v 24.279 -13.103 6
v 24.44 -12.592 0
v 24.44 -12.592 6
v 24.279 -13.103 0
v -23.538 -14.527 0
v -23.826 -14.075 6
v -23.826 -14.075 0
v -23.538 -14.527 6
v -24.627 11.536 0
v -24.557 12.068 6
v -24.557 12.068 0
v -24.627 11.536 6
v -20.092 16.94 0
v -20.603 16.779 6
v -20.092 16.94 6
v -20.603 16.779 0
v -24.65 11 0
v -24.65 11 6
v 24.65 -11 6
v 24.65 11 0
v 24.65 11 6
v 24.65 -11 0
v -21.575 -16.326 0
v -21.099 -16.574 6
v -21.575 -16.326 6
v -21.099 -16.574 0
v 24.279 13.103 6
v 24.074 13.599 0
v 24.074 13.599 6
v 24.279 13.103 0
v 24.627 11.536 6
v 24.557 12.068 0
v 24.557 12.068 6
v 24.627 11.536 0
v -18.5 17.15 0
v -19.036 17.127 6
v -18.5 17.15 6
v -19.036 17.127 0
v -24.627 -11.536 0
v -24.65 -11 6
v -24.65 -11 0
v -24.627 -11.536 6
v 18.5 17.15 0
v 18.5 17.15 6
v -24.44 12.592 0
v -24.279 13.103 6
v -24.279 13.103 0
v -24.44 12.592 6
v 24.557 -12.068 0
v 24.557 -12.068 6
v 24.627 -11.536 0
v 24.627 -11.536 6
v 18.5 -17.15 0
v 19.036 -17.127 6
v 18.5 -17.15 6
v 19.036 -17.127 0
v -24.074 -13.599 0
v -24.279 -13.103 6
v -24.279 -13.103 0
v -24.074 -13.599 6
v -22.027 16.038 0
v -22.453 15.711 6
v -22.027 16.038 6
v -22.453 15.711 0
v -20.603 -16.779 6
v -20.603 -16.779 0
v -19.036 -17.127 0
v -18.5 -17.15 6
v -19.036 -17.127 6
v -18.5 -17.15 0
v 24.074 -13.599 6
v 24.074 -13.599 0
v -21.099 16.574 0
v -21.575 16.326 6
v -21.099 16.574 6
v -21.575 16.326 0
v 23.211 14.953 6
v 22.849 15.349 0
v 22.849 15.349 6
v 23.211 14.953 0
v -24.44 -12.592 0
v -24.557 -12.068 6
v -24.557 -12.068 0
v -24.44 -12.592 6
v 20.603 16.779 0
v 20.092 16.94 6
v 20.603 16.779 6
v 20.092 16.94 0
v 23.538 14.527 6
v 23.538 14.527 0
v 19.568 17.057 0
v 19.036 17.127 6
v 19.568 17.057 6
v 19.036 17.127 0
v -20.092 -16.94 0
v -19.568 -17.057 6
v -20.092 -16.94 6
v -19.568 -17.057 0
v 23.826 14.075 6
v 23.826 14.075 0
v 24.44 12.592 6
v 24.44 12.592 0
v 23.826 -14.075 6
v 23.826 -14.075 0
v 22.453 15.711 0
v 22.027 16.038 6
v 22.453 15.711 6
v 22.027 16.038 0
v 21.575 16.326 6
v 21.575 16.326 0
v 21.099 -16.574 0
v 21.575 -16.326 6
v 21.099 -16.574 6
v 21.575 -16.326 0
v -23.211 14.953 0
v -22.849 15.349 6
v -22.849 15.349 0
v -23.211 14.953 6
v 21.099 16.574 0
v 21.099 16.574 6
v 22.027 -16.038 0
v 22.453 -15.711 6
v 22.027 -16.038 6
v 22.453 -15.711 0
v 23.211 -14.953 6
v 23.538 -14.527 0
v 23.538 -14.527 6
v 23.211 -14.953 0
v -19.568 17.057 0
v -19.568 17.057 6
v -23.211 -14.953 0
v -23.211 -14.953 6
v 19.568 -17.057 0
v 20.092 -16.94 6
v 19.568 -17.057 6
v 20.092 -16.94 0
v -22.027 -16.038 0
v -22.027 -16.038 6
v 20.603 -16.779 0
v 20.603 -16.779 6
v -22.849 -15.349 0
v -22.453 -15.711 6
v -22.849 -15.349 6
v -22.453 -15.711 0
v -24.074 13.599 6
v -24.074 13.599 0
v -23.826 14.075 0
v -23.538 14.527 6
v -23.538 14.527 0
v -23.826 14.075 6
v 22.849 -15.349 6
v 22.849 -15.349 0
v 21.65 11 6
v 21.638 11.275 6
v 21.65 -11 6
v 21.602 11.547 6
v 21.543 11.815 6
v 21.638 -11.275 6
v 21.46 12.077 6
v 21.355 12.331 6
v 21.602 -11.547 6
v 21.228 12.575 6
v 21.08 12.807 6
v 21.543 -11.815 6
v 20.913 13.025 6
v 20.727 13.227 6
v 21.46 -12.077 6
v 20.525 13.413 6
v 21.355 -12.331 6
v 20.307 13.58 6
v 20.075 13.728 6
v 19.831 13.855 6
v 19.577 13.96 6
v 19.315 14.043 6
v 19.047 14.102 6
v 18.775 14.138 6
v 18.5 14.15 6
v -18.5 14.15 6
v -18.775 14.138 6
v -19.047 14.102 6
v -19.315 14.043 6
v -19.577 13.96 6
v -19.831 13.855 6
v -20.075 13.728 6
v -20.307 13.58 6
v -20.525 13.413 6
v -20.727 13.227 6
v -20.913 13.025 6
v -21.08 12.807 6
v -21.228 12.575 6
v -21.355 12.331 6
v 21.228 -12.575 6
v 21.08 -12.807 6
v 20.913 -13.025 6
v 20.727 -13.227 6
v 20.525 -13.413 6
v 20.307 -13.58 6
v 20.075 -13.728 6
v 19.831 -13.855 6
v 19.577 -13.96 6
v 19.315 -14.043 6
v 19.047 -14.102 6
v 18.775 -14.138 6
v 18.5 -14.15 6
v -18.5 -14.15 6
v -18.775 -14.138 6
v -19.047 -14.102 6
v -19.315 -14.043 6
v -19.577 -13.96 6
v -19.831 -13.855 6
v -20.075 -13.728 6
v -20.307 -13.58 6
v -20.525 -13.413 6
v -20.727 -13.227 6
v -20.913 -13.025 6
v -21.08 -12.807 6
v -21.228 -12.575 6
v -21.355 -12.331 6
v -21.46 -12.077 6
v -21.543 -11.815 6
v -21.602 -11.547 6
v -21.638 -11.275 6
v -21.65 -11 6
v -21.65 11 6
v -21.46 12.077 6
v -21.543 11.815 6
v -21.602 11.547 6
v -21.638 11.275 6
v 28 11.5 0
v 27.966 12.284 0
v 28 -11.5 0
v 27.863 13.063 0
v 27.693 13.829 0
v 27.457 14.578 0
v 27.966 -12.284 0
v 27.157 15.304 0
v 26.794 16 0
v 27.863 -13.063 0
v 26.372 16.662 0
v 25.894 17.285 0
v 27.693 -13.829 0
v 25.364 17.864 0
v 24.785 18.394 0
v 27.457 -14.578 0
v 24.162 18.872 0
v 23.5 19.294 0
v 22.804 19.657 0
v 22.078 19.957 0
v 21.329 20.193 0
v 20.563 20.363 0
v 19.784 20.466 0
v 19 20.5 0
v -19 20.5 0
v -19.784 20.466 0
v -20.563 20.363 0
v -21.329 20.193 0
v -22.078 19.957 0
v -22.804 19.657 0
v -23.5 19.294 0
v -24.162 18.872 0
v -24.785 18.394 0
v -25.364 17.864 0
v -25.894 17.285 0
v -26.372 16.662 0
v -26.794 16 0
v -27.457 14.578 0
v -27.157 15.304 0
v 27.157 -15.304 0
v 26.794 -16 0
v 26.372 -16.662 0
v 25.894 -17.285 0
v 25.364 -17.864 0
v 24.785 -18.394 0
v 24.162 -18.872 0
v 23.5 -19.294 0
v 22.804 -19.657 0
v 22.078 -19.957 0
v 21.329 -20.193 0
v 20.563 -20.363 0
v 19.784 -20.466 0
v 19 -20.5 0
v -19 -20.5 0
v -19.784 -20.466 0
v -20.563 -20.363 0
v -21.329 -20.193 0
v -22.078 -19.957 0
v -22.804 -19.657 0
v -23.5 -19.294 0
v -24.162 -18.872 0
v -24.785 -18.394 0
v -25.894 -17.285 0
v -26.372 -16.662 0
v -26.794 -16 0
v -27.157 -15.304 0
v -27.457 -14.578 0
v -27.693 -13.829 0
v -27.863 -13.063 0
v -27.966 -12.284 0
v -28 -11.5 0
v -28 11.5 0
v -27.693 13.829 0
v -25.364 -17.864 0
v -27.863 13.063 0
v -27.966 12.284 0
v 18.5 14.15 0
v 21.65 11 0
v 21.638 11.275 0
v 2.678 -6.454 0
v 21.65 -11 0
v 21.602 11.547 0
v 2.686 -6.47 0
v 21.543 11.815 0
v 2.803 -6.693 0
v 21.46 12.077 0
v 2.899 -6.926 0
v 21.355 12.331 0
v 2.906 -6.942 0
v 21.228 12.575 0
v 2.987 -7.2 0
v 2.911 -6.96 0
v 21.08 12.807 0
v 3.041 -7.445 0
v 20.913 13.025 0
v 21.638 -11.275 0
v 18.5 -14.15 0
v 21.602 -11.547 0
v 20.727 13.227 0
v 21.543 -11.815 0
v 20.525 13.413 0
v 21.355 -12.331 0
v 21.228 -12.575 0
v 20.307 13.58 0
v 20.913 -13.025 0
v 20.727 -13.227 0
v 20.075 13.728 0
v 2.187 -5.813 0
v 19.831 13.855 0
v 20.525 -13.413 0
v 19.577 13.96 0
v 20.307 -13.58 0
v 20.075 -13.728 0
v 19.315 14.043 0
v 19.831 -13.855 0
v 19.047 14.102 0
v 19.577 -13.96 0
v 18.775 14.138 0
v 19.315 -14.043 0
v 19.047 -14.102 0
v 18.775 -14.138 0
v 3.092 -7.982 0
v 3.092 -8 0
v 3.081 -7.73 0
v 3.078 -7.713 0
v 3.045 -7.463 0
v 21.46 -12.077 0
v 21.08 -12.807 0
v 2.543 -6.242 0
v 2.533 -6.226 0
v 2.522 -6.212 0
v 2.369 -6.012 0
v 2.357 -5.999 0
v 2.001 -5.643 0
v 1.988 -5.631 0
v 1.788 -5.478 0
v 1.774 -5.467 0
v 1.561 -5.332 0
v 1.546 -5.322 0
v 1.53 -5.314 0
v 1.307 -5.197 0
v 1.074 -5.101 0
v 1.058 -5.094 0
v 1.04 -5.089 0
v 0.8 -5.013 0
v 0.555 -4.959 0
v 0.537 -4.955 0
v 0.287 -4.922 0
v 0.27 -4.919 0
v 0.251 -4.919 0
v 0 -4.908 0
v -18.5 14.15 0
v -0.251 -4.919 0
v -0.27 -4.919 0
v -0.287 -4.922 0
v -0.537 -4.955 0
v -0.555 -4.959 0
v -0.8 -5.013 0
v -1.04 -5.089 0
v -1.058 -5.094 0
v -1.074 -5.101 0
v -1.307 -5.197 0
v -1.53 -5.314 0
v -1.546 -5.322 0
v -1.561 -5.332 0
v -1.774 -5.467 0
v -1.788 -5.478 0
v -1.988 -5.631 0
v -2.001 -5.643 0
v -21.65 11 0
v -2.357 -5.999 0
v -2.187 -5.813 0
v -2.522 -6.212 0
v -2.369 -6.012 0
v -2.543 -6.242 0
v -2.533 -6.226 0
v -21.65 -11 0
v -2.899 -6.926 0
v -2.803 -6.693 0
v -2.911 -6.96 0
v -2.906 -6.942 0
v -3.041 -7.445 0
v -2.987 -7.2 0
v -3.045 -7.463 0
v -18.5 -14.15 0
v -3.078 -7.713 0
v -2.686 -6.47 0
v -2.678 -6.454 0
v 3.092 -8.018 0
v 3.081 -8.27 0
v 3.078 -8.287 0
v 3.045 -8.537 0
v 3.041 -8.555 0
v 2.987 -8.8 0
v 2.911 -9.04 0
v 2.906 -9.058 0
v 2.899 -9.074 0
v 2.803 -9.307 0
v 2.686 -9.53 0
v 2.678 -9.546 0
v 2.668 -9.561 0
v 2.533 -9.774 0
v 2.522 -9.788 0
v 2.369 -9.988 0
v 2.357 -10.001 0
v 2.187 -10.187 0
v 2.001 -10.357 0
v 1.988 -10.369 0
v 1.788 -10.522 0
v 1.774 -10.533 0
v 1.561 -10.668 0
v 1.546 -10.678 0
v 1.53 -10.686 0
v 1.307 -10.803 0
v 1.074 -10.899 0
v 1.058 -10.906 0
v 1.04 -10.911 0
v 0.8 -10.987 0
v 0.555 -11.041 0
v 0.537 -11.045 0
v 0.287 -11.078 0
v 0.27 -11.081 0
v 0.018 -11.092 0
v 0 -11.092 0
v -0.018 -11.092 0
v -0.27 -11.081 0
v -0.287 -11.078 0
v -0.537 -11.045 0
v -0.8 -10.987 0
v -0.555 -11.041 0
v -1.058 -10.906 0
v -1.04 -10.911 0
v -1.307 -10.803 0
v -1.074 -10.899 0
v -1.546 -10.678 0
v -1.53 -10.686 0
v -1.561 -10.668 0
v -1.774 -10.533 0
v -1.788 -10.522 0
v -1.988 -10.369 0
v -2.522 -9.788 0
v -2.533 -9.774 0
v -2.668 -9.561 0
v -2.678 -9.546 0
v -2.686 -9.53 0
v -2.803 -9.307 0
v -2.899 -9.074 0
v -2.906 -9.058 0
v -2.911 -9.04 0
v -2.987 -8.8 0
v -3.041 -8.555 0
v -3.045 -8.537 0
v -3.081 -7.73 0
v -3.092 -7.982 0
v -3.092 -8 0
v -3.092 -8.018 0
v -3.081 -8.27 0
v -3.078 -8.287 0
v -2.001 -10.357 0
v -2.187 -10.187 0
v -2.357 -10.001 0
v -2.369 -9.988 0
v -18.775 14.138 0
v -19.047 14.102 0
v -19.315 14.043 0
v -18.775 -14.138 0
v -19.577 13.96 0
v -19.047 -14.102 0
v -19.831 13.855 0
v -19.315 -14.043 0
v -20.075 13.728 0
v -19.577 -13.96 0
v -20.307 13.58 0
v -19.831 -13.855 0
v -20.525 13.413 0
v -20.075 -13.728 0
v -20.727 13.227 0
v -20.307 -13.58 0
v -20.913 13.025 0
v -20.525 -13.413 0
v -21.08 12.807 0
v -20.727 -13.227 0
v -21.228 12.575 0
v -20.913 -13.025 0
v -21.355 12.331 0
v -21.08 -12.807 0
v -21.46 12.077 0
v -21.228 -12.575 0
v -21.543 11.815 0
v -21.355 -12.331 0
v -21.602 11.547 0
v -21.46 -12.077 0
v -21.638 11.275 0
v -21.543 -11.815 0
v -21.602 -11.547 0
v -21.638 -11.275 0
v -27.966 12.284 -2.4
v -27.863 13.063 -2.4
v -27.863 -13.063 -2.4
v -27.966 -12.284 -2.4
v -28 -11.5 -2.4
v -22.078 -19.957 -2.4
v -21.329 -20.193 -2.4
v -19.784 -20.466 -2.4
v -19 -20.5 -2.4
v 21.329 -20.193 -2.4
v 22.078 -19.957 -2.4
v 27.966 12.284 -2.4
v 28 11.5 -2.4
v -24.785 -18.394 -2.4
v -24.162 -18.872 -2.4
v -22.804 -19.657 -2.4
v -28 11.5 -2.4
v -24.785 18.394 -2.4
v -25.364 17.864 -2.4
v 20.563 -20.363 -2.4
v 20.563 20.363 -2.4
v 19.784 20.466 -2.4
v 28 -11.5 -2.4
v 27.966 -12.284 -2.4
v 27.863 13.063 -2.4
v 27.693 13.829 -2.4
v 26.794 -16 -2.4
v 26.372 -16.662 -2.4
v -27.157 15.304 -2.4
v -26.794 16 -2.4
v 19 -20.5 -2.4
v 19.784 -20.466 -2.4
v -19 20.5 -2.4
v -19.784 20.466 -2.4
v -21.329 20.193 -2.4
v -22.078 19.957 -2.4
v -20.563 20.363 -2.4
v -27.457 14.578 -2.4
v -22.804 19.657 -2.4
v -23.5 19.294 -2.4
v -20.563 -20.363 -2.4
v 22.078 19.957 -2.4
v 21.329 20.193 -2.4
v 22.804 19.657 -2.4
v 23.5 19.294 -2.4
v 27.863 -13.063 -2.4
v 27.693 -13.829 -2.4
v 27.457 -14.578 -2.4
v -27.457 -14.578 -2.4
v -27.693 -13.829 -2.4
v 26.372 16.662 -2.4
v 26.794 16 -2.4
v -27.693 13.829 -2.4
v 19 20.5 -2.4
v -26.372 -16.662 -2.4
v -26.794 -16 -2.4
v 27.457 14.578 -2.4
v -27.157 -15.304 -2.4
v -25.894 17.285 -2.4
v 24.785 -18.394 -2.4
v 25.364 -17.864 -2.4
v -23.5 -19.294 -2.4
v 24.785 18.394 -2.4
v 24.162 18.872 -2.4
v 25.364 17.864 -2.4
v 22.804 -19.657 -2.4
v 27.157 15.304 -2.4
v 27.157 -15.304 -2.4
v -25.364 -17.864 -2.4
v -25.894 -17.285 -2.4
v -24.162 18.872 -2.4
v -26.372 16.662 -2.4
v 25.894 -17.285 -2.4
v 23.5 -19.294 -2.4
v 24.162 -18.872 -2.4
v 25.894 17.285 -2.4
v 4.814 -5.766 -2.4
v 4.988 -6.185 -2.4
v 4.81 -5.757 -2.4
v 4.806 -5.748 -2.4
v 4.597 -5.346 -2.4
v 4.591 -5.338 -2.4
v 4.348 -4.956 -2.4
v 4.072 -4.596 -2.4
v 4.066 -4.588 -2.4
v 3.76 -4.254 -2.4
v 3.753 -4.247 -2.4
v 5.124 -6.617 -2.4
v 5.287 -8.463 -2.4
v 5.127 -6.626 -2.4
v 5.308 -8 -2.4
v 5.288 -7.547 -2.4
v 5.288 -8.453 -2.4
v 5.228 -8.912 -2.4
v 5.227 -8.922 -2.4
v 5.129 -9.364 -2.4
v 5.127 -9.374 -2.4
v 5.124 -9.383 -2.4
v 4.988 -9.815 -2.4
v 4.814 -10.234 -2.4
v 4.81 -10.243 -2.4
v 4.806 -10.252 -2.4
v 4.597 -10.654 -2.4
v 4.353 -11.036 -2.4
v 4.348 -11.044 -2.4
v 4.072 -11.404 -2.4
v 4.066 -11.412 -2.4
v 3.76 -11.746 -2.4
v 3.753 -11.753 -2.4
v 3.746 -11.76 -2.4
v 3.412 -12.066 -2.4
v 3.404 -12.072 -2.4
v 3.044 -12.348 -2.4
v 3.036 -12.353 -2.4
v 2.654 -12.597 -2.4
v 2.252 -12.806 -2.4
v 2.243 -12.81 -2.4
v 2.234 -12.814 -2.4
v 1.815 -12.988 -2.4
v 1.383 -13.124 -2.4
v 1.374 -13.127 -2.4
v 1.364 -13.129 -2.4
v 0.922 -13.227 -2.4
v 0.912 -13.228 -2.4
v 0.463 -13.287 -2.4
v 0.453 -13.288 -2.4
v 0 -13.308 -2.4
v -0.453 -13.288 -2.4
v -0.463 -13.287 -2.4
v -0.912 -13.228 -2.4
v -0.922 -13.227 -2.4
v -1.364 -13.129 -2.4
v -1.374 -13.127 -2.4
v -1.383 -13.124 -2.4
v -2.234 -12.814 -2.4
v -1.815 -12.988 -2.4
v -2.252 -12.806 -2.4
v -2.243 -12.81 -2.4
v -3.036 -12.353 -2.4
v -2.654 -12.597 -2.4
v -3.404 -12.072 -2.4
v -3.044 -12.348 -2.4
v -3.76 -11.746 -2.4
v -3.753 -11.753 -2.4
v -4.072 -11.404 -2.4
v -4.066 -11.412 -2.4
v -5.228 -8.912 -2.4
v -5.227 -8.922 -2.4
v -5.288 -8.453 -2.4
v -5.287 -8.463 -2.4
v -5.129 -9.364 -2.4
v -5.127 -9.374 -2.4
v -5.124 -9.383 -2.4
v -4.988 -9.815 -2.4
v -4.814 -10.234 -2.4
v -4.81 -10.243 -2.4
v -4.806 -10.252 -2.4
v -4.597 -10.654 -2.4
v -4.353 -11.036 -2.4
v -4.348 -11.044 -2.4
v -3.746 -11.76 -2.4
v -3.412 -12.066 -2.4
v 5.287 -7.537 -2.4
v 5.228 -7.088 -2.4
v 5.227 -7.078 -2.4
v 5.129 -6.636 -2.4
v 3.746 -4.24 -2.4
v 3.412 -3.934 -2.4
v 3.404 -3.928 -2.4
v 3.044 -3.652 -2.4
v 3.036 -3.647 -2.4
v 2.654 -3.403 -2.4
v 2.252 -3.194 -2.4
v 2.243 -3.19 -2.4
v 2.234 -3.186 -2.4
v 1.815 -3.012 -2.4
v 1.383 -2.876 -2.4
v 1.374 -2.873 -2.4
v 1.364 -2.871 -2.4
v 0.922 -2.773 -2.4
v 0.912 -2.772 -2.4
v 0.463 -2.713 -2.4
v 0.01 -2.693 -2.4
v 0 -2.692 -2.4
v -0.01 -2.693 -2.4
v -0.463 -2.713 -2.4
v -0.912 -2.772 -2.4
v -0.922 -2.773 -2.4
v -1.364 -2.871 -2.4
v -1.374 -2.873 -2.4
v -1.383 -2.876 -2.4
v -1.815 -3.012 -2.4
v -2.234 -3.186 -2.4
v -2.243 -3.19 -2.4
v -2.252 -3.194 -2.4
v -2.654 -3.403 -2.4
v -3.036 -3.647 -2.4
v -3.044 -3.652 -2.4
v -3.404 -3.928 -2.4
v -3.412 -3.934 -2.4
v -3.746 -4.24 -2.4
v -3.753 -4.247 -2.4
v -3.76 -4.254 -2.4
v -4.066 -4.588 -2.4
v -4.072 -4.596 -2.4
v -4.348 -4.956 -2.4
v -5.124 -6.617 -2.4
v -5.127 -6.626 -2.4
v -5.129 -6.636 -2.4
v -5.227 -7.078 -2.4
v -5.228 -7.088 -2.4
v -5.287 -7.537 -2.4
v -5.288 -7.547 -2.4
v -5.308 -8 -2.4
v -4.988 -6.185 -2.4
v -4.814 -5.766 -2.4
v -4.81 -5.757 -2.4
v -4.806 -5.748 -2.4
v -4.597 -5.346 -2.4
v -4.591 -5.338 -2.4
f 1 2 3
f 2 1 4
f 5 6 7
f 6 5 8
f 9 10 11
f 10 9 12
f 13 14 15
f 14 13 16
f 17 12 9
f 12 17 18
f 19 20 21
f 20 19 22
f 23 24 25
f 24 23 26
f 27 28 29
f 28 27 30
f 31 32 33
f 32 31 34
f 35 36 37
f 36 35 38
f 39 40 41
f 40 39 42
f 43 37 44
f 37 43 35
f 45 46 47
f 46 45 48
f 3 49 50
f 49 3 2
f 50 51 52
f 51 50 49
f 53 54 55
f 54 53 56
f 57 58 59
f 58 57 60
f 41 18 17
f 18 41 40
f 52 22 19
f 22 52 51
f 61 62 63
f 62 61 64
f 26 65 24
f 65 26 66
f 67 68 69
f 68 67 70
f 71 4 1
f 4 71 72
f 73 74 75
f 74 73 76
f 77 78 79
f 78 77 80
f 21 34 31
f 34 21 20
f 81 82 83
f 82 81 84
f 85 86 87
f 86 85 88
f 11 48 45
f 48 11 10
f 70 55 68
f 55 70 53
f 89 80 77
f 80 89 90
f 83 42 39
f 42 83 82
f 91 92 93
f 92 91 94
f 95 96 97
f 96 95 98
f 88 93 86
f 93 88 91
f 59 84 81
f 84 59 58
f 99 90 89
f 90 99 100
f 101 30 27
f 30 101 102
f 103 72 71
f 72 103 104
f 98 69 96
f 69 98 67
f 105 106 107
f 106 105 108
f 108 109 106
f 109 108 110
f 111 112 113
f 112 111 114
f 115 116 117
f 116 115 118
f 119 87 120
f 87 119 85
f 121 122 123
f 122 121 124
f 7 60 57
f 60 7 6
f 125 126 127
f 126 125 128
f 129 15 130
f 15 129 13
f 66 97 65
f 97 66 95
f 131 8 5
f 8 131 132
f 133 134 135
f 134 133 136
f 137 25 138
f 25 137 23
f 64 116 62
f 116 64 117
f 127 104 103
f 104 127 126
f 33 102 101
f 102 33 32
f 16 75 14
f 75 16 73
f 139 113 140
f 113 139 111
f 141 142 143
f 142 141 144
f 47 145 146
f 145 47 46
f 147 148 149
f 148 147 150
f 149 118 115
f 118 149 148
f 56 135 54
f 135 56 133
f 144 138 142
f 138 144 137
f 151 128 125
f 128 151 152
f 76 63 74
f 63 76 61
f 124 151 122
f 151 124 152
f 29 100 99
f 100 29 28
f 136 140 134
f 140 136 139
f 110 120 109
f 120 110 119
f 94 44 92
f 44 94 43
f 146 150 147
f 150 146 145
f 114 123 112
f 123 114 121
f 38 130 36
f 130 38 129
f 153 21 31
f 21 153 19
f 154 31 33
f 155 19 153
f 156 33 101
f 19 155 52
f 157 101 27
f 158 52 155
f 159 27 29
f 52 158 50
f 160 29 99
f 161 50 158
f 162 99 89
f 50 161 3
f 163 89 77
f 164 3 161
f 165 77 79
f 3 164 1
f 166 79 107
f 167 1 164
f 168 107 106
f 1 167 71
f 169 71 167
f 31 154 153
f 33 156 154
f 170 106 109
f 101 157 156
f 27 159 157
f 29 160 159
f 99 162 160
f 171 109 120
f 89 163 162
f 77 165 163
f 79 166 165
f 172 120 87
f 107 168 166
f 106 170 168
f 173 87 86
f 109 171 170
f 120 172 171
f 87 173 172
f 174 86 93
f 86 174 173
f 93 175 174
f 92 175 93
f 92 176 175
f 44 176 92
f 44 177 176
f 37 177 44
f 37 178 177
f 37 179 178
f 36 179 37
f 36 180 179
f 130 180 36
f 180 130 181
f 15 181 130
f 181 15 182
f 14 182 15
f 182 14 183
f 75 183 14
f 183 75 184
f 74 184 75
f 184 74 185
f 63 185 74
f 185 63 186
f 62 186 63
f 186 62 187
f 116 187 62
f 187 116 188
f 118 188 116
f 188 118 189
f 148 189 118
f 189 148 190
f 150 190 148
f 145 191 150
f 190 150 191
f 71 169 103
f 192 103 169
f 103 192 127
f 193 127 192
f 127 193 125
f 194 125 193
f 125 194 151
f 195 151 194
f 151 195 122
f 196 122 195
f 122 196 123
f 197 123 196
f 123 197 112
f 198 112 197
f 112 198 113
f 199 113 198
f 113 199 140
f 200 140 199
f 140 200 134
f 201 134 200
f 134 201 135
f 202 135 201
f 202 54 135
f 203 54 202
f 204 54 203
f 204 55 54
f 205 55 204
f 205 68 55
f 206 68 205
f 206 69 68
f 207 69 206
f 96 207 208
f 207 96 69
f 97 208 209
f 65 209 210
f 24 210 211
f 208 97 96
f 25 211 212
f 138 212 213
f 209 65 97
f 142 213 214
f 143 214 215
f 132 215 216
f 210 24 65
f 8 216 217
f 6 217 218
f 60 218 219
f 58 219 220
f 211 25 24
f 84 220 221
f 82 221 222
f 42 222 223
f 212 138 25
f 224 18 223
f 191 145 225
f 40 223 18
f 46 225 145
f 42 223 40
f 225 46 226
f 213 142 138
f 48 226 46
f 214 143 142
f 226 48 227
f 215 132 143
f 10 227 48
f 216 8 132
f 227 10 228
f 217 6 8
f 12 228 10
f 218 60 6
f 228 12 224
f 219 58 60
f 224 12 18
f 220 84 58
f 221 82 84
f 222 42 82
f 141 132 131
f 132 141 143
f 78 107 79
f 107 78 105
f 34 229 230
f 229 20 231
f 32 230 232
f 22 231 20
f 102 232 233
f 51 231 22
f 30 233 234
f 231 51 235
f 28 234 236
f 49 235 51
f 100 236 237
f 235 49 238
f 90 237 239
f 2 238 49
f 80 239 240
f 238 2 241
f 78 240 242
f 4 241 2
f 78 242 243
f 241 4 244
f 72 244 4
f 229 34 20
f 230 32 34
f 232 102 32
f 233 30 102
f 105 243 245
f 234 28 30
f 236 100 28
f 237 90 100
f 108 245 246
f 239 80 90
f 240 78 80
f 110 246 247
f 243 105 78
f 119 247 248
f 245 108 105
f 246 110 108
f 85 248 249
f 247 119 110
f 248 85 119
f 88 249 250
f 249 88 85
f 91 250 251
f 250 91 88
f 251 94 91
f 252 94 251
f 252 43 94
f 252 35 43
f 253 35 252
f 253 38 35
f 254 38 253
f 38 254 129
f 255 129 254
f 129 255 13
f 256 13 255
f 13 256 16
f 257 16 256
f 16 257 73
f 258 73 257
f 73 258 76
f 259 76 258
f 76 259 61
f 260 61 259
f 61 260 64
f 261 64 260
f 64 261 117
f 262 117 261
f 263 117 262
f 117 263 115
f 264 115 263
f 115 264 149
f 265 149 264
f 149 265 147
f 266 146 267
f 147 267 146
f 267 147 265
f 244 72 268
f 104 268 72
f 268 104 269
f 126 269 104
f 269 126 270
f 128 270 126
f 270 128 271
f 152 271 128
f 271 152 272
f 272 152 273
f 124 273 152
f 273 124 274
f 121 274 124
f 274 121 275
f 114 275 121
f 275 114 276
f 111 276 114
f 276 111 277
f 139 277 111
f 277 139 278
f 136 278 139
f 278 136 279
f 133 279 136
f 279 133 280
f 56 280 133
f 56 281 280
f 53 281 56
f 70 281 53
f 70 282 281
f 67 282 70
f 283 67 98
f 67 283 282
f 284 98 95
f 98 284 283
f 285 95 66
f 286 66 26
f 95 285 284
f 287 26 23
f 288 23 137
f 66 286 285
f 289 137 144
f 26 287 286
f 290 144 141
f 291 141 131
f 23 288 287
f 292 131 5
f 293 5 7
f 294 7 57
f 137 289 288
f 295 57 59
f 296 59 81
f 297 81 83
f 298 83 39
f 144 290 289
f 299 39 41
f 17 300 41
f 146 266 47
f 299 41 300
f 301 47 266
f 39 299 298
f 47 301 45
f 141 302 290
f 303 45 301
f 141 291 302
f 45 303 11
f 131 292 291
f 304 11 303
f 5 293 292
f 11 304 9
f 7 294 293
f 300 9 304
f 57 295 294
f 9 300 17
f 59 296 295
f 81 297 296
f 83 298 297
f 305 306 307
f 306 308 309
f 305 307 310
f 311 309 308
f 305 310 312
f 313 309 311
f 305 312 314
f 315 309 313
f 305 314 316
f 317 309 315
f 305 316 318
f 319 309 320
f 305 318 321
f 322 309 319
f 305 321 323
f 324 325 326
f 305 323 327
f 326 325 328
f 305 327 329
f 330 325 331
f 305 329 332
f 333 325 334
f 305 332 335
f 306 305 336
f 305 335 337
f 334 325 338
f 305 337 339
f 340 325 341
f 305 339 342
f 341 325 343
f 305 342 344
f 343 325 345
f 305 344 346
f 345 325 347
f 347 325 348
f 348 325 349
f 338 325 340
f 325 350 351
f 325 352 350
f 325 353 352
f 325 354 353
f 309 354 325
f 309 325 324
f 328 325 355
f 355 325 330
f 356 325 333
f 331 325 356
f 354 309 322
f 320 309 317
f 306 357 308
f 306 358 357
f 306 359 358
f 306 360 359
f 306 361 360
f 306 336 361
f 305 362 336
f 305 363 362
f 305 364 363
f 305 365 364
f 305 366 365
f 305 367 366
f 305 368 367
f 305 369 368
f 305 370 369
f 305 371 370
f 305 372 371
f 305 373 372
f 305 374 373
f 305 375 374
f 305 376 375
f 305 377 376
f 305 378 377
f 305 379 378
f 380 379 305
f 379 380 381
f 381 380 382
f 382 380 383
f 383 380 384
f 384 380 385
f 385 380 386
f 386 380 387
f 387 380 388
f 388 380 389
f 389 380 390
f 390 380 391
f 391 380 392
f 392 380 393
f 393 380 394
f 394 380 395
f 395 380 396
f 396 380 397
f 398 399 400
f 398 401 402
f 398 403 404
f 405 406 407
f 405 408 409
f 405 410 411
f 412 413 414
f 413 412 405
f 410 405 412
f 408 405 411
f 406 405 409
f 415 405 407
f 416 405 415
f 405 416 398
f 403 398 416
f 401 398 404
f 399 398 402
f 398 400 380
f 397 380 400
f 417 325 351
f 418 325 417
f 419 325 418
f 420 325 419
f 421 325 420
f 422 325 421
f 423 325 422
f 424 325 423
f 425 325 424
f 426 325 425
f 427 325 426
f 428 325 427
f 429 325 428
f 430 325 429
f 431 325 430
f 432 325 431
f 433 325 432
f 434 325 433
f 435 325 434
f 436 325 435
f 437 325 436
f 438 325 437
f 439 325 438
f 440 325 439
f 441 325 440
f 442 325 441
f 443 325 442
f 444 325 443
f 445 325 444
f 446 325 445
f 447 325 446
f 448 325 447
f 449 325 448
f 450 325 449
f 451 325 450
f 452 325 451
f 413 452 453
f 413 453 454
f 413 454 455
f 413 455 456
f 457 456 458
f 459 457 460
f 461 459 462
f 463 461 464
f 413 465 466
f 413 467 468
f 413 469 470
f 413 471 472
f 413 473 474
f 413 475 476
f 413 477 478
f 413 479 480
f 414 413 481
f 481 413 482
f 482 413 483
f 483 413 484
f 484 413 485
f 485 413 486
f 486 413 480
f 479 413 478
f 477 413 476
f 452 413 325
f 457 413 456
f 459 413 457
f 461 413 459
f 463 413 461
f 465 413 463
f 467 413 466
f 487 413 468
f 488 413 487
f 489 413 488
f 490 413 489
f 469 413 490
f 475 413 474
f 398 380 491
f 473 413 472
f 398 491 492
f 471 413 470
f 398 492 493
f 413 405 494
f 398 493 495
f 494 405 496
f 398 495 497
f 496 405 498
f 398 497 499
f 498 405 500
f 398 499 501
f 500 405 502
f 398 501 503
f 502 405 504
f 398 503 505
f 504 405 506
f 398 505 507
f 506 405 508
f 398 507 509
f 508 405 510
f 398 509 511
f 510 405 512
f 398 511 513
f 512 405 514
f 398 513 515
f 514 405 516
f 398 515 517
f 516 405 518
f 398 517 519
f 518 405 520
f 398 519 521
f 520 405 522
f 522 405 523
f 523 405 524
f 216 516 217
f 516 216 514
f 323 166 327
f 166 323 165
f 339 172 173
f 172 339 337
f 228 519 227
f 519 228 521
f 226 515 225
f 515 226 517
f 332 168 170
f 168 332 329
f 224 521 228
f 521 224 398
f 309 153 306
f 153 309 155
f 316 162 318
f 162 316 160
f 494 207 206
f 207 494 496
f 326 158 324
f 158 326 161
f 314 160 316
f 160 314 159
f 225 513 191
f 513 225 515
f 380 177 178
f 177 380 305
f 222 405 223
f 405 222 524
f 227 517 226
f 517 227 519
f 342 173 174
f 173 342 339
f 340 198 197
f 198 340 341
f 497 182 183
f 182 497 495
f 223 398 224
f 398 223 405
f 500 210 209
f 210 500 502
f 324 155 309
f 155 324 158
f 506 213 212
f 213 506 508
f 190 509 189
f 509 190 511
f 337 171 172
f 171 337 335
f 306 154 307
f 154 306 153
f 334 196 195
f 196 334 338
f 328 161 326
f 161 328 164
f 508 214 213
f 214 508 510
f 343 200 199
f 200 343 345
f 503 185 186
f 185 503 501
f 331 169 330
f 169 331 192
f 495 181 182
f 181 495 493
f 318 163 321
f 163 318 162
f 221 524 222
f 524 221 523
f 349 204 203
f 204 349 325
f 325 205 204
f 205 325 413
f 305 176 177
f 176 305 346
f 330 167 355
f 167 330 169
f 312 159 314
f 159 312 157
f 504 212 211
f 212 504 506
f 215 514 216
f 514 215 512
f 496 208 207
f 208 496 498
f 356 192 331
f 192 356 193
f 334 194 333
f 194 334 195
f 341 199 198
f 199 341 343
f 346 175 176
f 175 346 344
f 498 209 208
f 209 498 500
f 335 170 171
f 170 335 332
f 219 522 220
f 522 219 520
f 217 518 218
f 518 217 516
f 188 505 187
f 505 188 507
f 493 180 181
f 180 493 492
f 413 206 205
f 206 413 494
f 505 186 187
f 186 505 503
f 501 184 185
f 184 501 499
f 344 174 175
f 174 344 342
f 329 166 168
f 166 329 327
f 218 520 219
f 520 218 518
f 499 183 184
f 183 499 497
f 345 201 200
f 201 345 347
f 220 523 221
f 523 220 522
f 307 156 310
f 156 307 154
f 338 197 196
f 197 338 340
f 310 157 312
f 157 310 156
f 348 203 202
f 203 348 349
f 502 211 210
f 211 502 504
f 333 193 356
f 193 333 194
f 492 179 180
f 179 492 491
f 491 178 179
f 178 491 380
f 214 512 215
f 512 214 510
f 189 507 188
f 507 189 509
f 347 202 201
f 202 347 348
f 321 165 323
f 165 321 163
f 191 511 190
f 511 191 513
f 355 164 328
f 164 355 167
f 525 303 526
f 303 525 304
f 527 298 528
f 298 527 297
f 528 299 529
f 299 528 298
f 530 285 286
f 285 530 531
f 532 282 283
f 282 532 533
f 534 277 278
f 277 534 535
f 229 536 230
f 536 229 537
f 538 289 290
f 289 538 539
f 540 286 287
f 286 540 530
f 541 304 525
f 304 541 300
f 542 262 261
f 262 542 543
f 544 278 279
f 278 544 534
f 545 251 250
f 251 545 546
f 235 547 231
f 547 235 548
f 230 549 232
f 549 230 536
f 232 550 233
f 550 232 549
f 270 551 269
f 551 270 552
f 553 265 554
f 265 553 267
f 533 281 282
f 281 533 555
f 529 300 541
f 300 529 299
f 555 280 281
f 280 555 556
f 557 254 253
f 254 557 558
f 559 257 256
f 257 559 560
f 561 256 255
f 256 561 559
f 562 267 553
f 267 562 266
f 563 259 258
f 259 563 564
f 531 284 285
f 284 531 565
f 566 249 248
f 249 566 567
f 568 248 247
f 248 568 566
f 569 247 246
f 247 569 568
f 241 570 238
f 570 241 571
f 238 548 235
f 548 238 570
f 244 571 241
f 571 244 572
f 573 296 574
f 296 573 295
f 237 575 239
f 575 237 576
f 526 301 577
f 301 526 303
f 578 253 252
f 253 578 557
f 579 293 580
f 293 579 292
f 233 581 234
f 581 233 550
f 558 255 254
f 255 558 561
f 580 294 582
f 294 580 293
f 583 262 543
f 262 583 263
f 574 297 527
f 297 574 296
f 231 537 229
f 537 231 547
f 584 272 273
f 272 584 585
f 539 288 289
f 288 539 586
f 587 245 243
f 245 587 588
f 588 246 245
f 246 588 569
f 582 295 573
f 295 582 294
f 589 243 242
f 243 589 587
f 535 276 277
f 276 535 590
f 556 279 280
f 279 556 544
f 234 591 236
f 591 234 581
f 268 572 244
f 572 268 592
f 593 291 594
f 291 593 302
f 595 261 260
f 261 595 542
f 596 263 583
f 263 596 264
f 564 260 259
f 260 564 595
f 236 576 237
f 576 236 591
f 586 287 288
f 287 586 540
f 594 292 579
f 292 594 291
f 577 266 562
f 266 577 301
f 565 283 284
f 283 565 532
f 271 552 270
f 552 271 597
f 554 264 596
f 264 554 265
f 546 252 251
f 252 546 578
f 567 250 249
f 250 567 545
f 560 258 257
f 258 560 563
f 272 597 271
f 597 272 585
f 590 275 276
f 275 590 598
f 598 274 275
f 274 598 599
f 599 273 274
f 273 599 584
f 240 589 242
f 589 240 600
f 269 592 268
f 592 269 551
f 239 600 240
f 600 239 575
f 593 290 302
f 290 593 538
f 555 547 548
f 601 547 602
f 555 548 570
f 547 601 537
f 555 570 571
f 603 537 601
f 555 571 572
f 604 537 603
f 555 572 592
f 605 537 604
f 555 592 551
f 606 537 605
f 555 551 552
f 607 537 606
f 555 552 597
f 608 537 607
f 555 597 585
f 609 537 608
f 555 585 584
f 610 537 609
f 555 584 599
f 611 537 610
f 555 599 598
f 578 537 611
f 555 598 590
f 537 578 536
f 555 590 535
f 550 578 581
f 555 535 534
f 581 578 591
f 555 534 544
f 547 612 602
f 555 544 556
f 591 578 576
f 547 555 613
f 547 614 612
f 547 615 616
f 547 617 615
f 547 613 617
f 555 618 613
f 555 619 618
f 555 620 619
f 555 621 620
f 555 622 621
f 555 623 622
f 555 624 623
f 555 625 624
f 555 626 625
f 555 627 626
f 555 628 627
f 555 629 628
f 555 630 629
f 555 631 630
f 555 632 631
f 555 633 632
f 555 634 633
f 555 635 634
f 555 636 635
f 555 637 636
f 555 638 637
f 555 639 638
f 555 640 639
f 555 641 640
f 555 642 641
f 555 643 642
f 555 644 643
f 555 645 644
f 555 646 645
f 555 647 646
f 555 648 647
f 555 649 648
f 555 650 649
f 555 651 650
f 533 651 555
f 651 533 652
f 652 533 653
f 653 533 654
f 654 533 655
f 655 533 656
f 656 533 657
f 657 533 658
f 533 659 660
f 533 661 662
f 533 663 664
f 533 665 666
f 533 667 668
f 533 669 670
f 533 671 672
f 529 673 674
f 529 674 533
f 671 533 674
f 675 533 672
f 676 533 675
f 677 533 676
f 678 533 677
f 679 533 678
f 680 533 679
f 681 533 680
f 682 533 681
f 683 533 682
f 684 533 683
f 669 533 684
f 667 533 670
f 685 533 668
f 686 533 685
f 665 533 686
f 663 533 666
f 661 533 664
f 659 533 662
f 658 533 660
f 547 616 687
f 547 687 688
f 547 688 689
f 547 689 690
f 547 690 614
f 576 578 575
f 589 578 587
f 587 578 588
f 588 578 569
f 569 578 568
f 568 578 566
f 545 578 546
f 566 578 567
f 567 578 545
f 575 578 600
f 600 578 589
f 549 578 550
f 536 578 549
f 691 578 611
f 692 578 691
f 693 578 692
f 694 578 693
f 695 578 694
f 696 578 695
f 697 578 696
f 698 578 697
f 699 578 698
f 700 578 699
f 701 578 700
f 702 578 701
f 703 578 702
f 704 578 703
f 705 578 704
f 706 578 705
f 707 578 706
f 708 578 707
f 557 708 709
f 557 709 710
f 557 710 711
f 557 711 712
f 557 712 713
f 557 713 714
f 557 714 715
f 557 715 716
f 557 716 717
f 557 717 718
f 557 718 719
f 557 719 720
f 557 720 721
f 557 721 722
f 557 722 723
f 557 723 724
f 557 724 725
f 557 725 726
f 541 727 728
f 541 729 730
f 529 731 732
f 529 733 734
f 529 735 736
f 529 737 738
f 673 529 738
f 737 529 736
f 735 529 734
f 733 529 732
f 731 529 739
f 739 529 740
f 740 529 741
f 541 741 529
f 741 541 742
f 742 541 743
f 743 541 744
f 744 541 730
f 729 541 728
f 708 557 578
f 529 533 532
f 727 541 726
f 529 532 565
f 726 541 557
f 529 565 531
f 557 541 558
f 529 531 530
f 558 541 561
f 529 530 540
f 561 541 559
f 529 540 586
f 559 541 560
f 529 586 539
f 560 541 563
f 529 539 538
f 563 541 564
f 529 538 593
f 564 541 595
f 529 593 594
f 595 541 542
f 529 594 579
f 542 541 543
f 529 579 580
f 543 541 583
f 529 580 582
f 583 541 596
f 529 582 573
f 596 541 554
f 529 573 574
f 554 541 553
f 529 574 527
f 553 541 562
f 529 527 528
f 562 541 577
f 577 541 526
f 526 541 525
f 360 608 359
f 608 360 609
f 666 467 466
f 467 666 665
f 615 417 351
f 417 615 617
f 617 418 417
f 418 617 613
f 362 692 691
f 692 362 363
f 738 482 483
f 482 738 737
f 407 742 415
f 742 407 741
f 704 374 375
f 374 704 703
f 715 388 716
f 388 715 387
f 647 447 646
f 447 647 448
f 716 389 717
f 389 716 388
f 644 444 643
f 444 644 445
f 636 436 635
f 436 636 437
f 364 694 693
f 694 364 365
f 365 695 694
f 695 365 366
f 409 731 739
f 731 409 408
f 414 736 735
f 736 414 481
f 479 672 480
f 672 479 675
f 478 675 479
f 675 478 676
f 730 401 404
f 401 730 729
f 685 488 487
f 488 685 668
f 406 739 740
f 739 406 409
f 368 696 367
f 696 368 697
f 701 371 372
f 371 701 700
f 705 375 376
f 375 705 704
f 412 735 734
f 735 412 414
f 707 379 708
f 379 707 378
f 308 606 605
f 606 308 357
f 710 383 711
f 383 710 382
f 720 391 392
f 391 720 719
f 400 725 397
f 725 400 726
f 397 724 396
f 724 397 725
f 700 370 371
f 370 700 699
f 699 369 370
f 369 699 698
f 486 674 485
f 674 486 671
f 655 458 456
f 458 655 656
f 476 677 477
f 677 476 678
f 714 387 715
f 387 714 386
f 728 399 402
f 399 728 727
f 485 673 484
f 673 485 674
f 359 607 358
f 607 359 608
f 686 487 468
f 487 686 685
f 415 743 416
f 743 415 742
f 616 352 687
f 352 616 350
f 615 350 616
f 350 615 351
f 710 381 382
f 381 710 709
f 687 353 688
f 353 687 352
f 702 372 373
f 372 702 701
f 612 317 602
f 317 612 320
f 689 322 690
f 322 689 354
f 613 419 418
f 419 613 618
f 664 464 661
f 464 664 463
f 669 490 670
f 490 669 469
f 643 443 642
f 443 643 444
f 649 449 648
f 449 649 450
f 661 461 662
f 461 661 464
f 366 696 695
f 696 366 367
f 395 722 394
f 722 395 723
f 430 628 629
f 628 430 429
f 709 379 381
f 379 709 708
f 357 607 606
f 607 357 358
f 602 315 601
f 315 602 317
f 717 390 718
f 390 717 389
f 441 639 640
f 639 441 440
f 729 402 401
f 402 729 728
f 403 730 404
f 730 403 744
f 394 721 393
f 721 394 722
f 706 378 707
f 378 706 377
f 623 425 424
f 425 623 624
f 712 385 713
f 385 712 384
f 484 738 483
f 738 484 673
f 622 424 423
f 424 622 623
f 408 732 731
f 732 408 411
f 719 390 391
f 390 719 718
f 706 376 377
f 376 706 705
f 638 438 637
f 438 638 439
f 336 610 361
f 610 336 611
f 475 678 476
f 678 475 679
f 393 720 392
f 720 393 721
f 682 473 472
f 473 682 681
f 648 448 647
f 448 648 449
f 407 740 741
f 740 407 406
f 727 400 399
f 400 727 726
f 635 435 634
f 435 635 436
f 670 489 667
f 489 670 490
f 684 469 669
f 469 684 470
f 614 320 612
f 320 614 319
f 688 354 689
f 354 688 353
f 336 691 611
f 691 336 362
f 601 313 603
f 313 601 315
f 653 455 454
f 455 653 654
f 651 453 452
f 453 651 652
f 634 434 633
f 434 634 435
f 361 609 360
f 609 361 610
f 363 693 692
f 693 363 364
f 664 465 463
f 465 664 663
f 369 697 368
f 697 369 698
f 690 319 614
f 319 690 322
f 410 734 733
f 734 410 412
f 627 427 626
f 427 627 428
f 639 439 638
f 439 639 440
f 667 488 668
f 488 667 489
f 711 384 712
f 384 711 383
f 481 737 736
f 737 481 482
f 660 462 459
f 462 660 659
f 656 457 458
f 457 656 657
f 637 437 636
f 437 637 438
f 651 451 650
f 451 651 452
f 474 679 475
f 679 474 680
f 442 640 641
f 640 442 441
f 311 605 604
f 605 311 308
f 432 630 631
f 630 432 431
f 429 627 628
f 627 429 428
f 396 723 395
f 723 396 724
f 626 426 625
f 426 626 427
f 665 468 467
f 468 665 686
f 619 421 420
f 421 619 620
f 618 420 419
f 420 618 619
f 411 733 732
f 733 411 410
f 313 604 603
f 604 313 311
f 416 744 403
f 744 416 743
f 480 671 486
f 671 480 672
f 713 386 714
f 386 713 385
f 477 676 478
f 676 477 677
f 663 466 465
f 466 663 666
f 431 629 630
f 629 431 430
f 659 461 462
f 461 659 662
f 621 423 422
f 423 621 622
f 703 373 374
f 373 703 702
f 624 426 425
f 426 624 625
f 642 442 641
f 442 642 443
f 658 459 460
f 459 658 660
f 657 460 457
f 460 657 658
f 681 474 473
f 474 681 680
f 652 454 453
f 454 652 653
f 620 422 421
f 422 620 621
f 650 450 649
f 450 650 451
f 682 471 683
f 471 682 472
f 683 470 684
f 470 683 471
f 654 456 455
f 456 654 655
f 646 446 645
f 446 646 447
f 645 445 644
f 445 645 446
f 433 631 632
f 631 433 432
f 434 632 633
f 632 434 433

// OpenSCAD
// file: ../lib/project/util.scad
// lib/project/util.scad
// Minimal general-purpose helpers for OpenSCAD projects.
// Keep this small to avoid conflicts with external libraries.

// Clamp helper: returns x limited to [lo, hi].
function clamp(x, lo, hi) = min(max(x, lo), hi);

module debug_axes(len = 20, t = 0.8) {
  // X (red), Y (green), Z (blue), starting at origin extending +axis.
  color([1, 0, 0]) cube([len, t, t], center = false);
  color([0, 1, 0]) cube([t, len, t], center = false);
  color([0, 0, 1]) cube([t, t, len], center = false);
}

module through_hole(d, h, center = true) {
  cylinder(d = d, h = h, center = center);
}

// Subtractive union: through hole + counterbore near the "top" face.
// Intended usage: difference() { solid(); counterbore_hole(...); }
module counterbore_hole(through_d, bore_d, bore_h, h, center = true) {
  union() {
    cylinder(d = through_d, h = h, center = center);

    // Place counterbore at the positive-Z face if centered, else at top of part.
    translate([0, 0, center ? (h / 2 - bore_h / 2) : (h - bore_h)])
      cylinder(d = bore_d, h = bore_h, center = true);
  }
}

// Subtractive union: through hole + conical countersink near the "top" face.
module countersink_hole(through_d, sink_d, sink_h, h, center = true) {
  union() {
    cylinder(d = through_d, h = h, center = center);

    translate([0, 0, center ? (h / 2 - sink_h / 2) : (h - sink_h)])
      cylinder(d1 = sink_d, d2 = through_d, h = sink_h, center = true);
  }
}
// file: ../lib/project/lid_hole_guard.scad
// lib/project/lid_hole_guard.scad
// Aquarium lid opening guard with a top flange and a locating lip underneath.

use <util.scad>;

function safe_corner_radius(w, h, r) = clamp(r, 0.01, min(w, h) / 2 - 0.01);

module rounded_rect_2d(w, h, r) {
  radius = safe_corner_radius(w, h, r);

  hull() {
    for (x = [-1, 1], y = [-1, 1]) {
      translate([x * (w / 2 - radius), y * (h / 2 - radius)])
        circle(r = radius);
    }
  }
}

module rounded_rect_prism(w, h, r, z0, z1) {
  height = z1 - z0;

  translate([0, 0, z0])
    linear_extrude(height = height)
      rounded_rect_2d(w = w, h = h, r = r);
}

module lid_hole_guard(
  opening_w = 50,
  opening_h = 35,
  opening_corner_r = 4.5,
  lip_corner_r = 6.5,
  fit_clearance = 0.35,
  top_flange_margin = 3,
  top_flange_corner_r = 9,
  top_thickness = 2.4,
  lip_depth = 6,
  lip_wall = 3,
  feed_hole_d = 6,
  feed_hole_funnel_angle_deg = 45,
  feed_hole_offset_y = 0,
  debug = false
) {
  lip_w = opening_w - 2 * fit_clearance;
  lip_h = opening_h - 2 * fit_clearance;
  lip_r = safe_corner_radius(lip_w, lip_h, lip_corner_r - fit_clearance);

  flange_w = opening_w + 2 * top_flange_margin;
  flange_h = opening_h + 2 * top_flange_margin;
  flange_r = safe_corner_radius(flange_w, flange_h, top_flange_corner_r);

  lip_inner_w = max(lip_w - 2 * lip_wall, 6);
  lip_inner_h = max(lip_h - 2 * lip_wall, 6);
  lip_inner_r = safe_corner_radius(lip_inner_w, lip_inner_h, lip_r - lip_wall);
  feed_hole_funnel_angle = clamp(feed_hole_funnel_angle_deg, 0, 80);
  feed_hole_top_d = feed_hole_d + 2 * top_thickness * tan(feed_hole_funnel_angle);
  max_feed_hole_offset_y = max(flange_h / 2 - feed_hole_top_d / 2 - 0.5, 0);
  feed_hole_y = clamp(feed_hole_offset_y, -max_feed_hole_offset_y, max_feed_hole_offset_y);

  union() {
    difference() {
      union() {
        rounded_rect_prism(
          w = flange_w,
          h = flange_h,
          r = flange_r,
          z0 = 0,
          z1 = top_thickness
        );

        difference() {
          rounded_rect_prism(
            w = lip_w,
            h = lip_h,
            r = lip_r,
            z0 = -lip_depth,
            z1 = 0
          );

          rounded_rect_prism(
            w = lip_inner_w,
            h = lip_inner_h,
            r = lip_inner_r,
            z0 = -lip_depth - 0.1,
            z1 = 0.1
          );
        }
      }

      if (feed_hole_d > 0) {
        translate([0, feed_hole_y, -0.1])
          // Wider at the installed top face, narrower where it exits into the tank.
          cylinder(
            d1 = feed_hole_d,
            d2 = feed_hole_top_d,
            h = top_thickness + 0.2,
            center = false
          );
      }
    }

    if (debug) {
      color([1, 0, 0, 0.35])
        rounded_rect_prism(
          w = opening_w,
          h = opening_h,
          r = opening_corner_r,
          z0 = -0.2,
          z1 = 0.2
        );

      color([0, 0, 1, 0.35])
        rounded_rect_prism(
          w = lip_w,
          h = lip_h,
          r = lip_r,
          z0 = -lip_depth,
          z1 = 0
        );
    }
  }
}
// main file
// models/lid_hole_jump_guard.scad
// Default printable guard for a rounded-rectangle aquarium lid opening.

use <../lib/project/lid_hole_guard.scad>;

// ---------- Public parameters (mm) ----------
debug = false;

// Measured from the lid opening with calipers.
opening_w = 50;
opening_h = 35;
opening_corner_r = 4.5;
lip_corner_r = 6.5;

fit_clearance = 0.35;
top_flange_margin = 3;
top_flange_corner_r = 9;
top_thickness = 2.4;
lip_depth = 6;
lip_wall = 3;

feed_hole_d = 6;
feed_hole_funnel_angle_deg = 45;
// Positive Y shifts the feed hole toward one of the long sides.
feed_hole_offset_y = 8;

$fn = 72;

// ---------- Model ----------
rotate([180, 0, 0])
  lid_hole_guard(
    opening_w = opening_w,
    opening_h = opening_h,
    opening_corner_r = opening_corner_r,
    lip_corner_r = lip_corner_r,
    fit_clearance = fit_clearance,
    top_flange_margin = top_flange_margin,
    top_flange_corner_r = top_flange_corner_r,
    top_thickness = top_thickness,
    lip_depth = lip_depth,
    lip_wall = lip_wall,
    feed_hole_d = feed_hole_d,
    feed_hole_funnel_angle_deg = feed_hole_funnel_angle_deg,
    feed_hole_offset_y = feed_hole_offset_y,
    debug = debug
  );
